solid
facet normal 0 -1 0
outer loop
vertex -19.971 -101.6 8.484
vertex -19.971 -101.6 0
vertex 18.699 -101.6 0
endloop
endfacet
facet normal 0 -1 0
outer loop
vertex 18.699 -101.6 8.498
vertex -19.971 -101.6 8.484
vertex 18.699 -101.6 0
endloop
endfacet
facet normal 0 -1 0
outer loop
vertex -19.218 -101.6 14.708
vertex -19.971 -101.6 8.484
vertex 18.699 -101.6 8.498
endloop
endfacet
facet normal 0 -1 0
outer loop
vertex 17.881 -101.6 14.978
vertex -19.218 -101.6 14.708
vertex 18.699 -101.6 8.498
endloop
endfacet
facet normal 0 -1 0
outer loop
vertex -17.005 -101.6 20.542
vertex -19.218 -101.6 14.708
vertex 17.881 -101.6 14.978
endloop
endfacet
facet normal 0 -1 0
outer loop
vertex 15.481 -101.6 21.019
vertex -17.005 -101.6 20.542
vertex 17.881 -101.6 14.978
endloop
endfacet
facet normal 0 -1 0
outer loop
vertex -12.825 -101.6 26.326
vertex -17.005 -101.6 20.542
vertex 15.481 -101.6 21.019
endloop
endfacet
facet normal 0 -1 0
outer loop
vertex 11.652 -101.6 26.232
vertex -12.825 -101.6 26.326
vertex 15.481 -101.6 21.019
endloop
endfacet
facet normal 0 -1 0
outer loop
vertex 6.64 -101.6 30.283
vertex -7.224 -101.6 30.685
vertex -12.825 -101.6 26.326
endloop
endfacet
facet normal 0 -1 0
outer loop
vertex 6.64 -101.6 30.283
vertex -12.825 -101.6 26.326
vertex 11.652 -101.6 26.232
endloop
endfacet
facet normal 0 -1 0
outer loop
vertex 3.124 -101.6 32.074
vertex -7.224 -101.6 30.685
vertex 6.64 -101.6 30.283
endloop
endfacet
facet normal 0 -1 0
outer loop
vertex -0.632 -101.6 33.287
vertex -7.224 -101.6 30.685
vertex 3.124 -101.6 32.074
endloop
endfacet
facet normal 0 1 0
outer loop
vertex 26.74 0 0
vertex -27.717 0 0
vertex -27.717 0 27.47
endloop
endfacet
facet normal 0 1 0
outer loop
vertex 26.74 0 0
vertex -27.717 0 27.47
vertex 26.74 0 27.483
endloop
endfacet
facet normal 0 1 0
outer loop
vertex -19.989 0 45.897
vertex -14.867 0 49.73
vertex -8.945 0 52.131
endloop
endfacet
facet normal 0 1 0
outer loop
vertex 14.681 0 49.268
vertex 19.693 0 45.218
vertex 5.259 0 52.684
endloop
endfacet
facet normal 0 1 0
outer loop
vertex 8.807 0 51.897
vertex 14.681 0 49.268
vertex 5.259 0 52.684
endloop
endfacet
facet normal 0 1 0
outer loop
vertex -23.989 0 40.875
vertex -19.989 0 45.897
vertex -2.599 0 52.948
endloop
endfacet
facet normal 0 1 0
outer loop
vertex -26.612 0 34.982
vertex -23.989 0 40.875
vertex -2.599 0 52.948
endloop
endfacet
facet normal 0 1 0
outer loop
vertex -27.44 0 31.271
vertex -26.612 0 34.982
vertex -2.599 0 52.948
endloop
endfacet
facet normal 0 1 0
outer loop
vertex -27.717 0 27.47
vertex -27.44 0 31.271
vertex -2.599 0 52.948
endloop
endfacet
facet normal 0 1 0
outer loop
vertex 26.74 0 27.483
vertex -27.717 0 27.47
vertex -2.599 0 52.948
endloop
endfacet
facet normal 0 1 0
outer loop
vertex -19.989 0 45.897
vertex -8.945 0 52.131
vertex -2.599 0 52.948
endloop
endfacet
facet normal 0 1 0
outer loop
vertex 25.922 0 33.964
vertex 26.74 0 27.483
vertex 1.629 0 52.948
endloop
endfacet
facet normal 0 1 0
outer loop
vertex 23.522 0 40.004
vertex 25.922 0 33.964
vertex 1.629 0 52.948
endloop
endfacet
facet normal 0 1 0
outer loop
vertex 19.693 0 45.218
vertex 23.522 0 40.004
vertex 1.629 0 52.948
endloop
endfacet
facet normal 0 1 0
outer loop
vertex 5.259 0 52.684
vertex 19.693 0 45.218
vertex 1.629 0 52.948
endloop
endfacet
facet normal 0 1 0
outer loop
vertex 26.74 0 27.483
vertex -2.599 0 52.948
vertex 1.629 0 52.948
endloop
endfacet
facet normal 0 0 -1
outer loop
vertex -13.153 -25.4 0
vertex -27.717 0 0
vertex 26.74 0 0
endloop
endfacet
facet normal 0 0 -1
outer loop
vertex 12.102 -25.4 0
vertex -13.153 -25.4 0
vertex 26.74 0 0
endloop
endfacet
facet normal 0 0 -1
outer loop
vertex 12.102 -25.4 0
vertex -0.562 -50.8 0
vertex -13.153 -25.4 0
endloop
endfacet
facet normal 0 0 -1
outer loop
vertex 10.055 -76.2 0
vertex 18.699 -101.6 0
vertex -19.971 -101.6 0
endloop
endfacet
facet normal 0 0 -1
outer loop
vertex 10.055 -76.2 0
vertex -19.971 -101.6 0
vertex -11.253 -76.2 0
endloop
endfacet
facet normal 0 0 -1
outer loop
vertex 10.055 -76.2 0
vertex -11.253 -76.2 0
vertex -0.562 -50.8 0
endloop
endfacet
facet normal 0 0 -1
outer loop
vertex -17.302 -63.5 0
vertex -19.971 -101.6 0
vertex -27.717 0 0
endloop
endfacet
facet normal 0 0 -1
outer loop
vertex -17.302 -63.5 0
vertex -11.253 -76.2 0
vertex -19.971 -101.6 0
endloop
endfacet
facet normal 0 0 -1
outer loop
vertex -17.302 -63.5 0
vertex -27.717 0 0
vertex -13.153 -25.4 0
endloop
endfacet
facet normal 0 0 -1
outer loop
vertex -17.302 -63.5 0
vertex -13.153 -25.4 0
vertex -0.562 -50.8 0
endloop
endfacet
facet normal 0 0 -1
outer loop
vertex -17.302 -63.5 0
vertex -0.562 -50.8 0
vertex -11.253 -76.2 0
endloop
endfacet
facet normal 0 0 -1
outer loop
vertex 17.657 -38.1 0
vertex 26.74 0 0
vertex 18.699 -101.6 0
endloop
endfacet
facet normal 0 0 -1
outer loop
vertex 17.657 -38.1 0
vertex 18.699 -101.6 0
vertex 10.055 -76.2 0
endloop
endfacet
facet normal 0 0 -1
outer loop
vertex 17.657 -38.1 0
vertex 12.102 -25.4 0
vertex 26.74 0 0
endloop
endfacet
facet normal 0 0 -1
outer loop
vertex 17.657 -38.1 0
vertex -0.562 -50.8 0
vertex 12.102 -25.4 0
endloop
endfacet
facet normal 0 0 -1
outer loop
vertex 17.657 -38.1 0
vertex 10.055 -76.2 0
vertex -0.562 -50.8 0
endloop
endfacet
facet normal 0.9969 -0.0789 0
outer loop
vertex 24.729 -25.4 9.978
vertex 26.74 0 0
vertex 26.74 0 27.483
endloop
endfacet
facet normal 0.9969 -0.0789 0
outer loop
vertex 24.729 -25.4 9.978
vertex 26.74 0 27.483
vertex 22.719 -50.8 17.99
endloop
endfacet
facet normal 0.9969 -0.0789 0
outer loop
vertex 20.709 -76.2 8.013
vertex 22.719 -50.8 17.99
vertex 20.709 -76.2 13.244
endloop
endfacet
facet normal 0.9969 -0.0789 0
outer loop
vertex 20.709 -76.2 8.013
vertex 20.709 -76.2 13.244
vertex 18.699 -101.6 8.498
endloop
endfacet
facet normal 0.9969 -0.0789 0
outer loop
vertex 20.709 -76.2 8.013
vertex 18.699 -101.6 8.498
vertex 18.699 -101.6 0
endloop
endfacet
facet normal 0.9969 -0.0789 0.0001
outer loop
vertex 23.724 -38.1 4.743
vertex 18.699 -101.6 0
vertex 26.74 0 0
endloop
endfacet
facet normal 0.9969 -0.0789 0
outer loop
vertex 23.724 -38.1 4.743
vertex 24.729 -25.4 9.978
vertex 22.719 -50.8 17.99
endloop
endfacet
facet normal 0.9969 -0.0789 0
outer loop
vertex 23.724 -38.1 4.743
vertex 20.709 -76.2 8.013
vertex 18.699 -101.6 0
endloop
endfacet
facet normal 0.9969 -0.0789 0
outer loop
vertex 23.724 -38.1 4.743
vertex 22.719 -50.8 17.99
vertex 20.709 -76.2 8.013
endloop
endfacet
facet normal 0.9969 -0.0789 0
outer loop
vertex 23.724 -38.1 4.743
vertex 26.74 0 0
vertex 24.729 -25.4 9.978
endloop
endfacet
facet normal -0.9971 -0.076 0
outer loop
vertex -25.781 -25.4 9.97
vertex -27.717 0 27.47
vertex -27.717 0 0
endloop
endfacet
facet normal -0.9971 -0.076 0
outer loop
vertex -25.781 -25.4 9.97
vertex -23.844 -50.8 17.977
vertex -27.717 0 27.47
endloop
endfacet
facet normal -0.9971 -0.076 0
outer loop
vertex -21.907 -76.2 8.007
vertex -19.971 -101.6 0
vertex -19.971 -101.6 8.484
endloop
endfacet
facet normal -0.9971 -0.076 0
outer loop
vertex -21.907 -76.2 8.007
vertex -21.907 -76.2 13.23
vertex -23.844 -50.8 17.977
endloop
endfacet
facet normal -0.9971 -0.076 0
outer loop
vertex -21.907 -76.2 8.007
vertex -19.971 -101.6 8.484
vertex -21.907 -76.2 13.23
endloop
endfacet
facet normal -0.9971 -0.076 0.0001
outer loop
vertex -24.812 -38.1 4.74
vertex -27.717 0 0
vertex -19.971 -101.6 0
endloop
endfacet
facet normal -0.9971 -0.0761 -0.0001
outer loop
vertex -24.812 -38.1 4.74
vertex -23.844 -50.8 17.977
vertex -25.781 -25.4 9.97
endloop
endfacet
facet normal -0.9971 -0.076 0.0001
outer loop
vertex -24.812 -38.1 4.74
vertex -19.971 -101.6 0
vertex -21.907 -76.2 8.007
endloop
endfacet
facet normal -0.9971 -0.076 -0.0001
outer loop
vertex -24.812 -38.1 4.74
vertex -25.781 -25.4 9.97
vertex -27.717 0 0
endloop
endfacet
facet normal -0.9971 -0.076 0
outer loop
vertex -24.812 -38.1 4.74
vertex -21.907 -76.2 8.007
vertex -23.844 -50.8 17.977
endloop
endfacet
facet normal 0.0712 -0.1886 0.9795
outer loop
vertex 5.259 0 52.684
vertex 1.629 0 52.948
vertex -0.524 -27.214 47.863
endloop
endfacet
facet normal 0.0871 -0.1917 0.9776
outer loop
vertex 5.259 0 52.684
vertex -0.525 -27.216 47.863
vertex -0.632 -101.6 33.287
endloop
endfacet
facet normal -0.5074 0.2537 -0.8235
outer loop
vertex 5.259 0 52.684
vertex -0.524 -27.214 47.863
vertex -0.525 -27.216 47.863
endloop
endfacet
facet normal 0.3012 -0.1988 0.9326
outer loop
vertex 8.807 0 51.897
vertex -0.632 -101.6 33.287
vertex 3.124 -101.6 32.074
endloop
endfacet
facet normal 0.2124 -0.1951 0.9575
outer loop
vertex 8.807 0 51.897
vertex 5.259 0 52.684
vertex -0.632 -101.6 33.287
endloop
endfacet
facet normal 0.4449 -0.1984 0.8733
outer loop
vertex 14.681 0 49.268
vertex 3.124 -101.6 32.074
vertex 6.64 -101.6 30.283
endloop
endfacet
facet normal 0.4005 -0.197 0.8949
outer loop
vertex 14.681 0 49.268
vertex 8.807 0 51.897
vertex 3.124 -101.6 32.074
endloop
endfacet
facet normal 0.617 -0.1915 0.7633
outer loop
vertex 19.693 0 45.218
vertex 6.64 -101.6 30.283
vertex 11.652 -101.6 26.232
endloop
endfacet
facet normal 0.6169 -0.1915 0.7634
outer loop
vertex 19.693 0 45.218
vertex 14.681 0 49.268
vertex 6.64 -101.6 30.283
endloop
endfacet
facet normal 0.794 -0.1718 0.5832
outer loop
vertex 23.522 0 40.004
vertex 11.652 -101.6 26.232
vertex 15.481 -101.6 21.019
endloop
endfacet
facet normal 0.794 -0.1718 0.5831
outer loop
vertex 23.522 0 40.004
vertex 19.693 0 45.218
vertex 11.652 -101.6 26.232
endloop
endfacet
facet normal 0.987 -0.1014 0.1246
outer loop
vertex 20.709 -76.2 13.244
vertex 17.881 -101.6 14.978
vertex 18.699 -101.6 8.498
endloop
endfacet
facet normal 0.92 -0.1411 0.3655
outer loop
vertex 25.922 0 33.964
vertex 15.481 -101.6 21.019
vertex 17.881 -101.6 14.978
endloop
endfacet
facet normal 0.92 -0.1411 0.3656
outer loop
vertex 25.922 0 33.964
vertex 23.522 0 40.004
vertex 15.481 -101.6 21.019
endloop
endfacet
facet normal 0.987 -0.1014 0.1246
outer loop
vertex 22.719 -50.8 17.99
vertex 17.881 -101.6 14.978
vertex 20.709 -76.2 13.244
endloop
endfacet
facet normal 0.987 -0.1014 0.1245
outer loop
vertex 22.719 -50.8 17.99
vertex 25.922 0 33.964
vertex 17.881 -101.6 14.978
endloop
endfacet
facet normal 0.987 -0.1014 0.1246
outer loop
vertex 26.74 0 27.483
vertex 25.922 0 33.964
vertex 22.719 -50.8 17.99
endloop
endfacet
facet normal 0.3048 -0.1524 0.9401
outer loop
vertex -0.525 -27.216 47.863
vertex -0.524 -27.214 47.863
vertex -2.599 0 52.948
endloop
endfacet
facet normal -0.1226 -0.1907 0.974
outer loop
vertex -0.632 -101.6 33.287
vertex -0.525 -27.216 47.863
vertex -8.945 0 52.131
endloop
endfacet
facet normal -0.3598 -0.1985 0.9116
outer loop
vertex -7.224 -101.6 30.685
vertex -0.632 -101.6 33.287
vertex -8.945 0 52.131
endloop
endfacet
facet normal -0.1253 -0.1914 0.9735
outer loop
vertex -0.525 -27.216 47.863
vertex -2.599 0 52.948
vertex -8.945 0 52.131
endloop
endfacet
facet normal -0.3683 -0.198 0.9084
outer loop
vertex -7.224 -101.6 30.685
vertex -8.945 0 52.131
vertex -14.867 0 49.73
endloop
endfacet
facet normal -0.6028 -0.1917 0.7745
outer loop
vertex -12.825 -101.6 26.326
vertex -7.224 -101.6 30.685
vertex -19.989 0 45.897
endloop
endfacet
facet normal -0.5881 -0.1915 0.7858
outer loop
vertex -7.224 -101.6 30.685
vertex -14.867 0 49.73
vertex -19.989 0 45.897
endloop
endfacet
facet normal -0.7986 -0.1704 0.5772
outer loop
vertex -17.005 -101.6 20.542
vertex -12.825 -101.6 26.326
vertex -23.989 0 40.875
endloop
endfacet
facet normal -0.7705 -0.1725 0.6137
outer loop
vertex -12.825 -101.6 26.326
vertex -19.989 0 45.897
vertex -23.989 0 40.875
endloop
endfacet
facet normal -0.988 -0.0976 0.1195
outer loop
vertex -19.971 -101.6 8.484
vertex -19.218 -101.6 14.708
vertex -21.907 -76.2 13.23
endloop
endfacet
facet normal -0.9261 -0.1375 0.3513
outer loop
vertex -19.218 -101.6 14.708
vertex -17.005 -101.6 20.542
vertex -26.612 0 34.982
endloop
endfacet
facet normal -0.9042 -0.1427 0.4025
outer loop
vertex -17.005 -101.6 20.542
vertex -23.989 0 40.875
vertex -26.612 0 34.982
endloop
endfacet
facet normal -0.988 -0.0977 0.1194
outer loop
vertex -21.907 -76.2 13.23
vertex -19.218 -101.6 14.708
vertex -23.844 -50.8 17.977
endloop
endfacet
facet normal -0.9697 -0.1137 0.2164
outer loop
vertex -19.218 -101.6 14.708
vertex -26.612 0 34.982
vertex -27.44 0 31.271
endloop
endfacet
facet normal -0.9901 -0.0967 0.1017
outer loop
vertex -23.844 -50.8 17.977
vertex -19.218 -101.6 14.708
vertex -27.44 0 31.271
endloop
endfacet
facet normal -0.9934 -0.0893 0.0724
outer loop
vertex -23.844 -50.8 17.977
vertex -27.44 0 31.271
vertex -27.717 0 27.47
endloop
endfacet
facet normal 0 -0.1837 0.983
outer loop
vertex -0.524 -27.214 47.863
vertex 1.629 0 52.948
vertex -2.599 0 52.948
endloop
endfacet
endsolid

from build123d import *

# Parameters (mm, degrees)
F0_W        = 54.4569883496
F0_H        = 52.9484525323
F2_W        = 38.669379428
F2_H        = 33.9629091322
F4_T1_DEPTH = 228.8872093308
F4_T3_DEPTH = 228.8436040844


# Not quite as in the source:
# - a fillet or chamfer that OpenCascade refuses, or shapes differently, is made with other operations: its cross-section is extruded or revolved along the edge and cut away or added


with BuildPart() as f3:
    # F0 (on Front) → F3 section 0
    with BuildSketch(Plane.XZ):
        with Locations((-0.4889173433, 26.4742262661)):
            Rectangle(F0_W, F0_H)
    # F2 (on offset) → F3 section 1
    with BuildSketch(Plane.XZ.offset(101.6)):
        with Locations((-0.6360104308, 16.9814545661)):
            Rectangle(F2_W, F2_H)
    loft()

    # F4: fillet of radius 25.4 on 2 edges, made by hand

    # F4_s2 → F4_t1 (cut)
    with BuildSketch(Plane(origin=(-5.5598937152, 72.9193556138, 13.6261180188), x_dir=(0.9971057986, 0.0760264846, 0), z_dir=(0.0747401792, -0.9802355917, -0.1831722969))):
        with BuildLine():
            ThreePointArc((-2.5919028833, 52.0164089613), (-20.3226785097, 44.4535478513), (-27.6371917475, 26.6188858536))
            Line((-27.6371917475, 26.6188858536), (-27.6371917475, 51.6666172583))
            Line((-27.6371917475, 51.6666172583), (-2.5919028833, 52.0164089613))
        make_face()
    extrude(amount=F4_T1_DEPTH, mode=Mode.SUBTRACT)

    # F4_s4 → F4_t3 (cut)
    with BuildSketch(Plane(origin=(5.7672479515, 72.8715156932, 13.6171783841), x_dir=(0.9968828528, -0.078895993, 0), z_dir=(-0.0775617197, -0.9800237693, -0.1831327146))):
        with BuildLine():
            ThreePointArc((1.6243248242, 52.0294565484), (19.3464124697, 44.4620185205), (26.6562256355, 26.6321239525))
            Line((26.6562256355, 26.6321239525), (26.6562256355, 51.6666537877))
            Line((26.6562256355, 51.6666537877), (1.6243248242, 52.0294565484))
        make_face()
    extrude(amount=F4_T3_DEPTH, mode=Mode.SUBTRACT)


solid = f3.part
